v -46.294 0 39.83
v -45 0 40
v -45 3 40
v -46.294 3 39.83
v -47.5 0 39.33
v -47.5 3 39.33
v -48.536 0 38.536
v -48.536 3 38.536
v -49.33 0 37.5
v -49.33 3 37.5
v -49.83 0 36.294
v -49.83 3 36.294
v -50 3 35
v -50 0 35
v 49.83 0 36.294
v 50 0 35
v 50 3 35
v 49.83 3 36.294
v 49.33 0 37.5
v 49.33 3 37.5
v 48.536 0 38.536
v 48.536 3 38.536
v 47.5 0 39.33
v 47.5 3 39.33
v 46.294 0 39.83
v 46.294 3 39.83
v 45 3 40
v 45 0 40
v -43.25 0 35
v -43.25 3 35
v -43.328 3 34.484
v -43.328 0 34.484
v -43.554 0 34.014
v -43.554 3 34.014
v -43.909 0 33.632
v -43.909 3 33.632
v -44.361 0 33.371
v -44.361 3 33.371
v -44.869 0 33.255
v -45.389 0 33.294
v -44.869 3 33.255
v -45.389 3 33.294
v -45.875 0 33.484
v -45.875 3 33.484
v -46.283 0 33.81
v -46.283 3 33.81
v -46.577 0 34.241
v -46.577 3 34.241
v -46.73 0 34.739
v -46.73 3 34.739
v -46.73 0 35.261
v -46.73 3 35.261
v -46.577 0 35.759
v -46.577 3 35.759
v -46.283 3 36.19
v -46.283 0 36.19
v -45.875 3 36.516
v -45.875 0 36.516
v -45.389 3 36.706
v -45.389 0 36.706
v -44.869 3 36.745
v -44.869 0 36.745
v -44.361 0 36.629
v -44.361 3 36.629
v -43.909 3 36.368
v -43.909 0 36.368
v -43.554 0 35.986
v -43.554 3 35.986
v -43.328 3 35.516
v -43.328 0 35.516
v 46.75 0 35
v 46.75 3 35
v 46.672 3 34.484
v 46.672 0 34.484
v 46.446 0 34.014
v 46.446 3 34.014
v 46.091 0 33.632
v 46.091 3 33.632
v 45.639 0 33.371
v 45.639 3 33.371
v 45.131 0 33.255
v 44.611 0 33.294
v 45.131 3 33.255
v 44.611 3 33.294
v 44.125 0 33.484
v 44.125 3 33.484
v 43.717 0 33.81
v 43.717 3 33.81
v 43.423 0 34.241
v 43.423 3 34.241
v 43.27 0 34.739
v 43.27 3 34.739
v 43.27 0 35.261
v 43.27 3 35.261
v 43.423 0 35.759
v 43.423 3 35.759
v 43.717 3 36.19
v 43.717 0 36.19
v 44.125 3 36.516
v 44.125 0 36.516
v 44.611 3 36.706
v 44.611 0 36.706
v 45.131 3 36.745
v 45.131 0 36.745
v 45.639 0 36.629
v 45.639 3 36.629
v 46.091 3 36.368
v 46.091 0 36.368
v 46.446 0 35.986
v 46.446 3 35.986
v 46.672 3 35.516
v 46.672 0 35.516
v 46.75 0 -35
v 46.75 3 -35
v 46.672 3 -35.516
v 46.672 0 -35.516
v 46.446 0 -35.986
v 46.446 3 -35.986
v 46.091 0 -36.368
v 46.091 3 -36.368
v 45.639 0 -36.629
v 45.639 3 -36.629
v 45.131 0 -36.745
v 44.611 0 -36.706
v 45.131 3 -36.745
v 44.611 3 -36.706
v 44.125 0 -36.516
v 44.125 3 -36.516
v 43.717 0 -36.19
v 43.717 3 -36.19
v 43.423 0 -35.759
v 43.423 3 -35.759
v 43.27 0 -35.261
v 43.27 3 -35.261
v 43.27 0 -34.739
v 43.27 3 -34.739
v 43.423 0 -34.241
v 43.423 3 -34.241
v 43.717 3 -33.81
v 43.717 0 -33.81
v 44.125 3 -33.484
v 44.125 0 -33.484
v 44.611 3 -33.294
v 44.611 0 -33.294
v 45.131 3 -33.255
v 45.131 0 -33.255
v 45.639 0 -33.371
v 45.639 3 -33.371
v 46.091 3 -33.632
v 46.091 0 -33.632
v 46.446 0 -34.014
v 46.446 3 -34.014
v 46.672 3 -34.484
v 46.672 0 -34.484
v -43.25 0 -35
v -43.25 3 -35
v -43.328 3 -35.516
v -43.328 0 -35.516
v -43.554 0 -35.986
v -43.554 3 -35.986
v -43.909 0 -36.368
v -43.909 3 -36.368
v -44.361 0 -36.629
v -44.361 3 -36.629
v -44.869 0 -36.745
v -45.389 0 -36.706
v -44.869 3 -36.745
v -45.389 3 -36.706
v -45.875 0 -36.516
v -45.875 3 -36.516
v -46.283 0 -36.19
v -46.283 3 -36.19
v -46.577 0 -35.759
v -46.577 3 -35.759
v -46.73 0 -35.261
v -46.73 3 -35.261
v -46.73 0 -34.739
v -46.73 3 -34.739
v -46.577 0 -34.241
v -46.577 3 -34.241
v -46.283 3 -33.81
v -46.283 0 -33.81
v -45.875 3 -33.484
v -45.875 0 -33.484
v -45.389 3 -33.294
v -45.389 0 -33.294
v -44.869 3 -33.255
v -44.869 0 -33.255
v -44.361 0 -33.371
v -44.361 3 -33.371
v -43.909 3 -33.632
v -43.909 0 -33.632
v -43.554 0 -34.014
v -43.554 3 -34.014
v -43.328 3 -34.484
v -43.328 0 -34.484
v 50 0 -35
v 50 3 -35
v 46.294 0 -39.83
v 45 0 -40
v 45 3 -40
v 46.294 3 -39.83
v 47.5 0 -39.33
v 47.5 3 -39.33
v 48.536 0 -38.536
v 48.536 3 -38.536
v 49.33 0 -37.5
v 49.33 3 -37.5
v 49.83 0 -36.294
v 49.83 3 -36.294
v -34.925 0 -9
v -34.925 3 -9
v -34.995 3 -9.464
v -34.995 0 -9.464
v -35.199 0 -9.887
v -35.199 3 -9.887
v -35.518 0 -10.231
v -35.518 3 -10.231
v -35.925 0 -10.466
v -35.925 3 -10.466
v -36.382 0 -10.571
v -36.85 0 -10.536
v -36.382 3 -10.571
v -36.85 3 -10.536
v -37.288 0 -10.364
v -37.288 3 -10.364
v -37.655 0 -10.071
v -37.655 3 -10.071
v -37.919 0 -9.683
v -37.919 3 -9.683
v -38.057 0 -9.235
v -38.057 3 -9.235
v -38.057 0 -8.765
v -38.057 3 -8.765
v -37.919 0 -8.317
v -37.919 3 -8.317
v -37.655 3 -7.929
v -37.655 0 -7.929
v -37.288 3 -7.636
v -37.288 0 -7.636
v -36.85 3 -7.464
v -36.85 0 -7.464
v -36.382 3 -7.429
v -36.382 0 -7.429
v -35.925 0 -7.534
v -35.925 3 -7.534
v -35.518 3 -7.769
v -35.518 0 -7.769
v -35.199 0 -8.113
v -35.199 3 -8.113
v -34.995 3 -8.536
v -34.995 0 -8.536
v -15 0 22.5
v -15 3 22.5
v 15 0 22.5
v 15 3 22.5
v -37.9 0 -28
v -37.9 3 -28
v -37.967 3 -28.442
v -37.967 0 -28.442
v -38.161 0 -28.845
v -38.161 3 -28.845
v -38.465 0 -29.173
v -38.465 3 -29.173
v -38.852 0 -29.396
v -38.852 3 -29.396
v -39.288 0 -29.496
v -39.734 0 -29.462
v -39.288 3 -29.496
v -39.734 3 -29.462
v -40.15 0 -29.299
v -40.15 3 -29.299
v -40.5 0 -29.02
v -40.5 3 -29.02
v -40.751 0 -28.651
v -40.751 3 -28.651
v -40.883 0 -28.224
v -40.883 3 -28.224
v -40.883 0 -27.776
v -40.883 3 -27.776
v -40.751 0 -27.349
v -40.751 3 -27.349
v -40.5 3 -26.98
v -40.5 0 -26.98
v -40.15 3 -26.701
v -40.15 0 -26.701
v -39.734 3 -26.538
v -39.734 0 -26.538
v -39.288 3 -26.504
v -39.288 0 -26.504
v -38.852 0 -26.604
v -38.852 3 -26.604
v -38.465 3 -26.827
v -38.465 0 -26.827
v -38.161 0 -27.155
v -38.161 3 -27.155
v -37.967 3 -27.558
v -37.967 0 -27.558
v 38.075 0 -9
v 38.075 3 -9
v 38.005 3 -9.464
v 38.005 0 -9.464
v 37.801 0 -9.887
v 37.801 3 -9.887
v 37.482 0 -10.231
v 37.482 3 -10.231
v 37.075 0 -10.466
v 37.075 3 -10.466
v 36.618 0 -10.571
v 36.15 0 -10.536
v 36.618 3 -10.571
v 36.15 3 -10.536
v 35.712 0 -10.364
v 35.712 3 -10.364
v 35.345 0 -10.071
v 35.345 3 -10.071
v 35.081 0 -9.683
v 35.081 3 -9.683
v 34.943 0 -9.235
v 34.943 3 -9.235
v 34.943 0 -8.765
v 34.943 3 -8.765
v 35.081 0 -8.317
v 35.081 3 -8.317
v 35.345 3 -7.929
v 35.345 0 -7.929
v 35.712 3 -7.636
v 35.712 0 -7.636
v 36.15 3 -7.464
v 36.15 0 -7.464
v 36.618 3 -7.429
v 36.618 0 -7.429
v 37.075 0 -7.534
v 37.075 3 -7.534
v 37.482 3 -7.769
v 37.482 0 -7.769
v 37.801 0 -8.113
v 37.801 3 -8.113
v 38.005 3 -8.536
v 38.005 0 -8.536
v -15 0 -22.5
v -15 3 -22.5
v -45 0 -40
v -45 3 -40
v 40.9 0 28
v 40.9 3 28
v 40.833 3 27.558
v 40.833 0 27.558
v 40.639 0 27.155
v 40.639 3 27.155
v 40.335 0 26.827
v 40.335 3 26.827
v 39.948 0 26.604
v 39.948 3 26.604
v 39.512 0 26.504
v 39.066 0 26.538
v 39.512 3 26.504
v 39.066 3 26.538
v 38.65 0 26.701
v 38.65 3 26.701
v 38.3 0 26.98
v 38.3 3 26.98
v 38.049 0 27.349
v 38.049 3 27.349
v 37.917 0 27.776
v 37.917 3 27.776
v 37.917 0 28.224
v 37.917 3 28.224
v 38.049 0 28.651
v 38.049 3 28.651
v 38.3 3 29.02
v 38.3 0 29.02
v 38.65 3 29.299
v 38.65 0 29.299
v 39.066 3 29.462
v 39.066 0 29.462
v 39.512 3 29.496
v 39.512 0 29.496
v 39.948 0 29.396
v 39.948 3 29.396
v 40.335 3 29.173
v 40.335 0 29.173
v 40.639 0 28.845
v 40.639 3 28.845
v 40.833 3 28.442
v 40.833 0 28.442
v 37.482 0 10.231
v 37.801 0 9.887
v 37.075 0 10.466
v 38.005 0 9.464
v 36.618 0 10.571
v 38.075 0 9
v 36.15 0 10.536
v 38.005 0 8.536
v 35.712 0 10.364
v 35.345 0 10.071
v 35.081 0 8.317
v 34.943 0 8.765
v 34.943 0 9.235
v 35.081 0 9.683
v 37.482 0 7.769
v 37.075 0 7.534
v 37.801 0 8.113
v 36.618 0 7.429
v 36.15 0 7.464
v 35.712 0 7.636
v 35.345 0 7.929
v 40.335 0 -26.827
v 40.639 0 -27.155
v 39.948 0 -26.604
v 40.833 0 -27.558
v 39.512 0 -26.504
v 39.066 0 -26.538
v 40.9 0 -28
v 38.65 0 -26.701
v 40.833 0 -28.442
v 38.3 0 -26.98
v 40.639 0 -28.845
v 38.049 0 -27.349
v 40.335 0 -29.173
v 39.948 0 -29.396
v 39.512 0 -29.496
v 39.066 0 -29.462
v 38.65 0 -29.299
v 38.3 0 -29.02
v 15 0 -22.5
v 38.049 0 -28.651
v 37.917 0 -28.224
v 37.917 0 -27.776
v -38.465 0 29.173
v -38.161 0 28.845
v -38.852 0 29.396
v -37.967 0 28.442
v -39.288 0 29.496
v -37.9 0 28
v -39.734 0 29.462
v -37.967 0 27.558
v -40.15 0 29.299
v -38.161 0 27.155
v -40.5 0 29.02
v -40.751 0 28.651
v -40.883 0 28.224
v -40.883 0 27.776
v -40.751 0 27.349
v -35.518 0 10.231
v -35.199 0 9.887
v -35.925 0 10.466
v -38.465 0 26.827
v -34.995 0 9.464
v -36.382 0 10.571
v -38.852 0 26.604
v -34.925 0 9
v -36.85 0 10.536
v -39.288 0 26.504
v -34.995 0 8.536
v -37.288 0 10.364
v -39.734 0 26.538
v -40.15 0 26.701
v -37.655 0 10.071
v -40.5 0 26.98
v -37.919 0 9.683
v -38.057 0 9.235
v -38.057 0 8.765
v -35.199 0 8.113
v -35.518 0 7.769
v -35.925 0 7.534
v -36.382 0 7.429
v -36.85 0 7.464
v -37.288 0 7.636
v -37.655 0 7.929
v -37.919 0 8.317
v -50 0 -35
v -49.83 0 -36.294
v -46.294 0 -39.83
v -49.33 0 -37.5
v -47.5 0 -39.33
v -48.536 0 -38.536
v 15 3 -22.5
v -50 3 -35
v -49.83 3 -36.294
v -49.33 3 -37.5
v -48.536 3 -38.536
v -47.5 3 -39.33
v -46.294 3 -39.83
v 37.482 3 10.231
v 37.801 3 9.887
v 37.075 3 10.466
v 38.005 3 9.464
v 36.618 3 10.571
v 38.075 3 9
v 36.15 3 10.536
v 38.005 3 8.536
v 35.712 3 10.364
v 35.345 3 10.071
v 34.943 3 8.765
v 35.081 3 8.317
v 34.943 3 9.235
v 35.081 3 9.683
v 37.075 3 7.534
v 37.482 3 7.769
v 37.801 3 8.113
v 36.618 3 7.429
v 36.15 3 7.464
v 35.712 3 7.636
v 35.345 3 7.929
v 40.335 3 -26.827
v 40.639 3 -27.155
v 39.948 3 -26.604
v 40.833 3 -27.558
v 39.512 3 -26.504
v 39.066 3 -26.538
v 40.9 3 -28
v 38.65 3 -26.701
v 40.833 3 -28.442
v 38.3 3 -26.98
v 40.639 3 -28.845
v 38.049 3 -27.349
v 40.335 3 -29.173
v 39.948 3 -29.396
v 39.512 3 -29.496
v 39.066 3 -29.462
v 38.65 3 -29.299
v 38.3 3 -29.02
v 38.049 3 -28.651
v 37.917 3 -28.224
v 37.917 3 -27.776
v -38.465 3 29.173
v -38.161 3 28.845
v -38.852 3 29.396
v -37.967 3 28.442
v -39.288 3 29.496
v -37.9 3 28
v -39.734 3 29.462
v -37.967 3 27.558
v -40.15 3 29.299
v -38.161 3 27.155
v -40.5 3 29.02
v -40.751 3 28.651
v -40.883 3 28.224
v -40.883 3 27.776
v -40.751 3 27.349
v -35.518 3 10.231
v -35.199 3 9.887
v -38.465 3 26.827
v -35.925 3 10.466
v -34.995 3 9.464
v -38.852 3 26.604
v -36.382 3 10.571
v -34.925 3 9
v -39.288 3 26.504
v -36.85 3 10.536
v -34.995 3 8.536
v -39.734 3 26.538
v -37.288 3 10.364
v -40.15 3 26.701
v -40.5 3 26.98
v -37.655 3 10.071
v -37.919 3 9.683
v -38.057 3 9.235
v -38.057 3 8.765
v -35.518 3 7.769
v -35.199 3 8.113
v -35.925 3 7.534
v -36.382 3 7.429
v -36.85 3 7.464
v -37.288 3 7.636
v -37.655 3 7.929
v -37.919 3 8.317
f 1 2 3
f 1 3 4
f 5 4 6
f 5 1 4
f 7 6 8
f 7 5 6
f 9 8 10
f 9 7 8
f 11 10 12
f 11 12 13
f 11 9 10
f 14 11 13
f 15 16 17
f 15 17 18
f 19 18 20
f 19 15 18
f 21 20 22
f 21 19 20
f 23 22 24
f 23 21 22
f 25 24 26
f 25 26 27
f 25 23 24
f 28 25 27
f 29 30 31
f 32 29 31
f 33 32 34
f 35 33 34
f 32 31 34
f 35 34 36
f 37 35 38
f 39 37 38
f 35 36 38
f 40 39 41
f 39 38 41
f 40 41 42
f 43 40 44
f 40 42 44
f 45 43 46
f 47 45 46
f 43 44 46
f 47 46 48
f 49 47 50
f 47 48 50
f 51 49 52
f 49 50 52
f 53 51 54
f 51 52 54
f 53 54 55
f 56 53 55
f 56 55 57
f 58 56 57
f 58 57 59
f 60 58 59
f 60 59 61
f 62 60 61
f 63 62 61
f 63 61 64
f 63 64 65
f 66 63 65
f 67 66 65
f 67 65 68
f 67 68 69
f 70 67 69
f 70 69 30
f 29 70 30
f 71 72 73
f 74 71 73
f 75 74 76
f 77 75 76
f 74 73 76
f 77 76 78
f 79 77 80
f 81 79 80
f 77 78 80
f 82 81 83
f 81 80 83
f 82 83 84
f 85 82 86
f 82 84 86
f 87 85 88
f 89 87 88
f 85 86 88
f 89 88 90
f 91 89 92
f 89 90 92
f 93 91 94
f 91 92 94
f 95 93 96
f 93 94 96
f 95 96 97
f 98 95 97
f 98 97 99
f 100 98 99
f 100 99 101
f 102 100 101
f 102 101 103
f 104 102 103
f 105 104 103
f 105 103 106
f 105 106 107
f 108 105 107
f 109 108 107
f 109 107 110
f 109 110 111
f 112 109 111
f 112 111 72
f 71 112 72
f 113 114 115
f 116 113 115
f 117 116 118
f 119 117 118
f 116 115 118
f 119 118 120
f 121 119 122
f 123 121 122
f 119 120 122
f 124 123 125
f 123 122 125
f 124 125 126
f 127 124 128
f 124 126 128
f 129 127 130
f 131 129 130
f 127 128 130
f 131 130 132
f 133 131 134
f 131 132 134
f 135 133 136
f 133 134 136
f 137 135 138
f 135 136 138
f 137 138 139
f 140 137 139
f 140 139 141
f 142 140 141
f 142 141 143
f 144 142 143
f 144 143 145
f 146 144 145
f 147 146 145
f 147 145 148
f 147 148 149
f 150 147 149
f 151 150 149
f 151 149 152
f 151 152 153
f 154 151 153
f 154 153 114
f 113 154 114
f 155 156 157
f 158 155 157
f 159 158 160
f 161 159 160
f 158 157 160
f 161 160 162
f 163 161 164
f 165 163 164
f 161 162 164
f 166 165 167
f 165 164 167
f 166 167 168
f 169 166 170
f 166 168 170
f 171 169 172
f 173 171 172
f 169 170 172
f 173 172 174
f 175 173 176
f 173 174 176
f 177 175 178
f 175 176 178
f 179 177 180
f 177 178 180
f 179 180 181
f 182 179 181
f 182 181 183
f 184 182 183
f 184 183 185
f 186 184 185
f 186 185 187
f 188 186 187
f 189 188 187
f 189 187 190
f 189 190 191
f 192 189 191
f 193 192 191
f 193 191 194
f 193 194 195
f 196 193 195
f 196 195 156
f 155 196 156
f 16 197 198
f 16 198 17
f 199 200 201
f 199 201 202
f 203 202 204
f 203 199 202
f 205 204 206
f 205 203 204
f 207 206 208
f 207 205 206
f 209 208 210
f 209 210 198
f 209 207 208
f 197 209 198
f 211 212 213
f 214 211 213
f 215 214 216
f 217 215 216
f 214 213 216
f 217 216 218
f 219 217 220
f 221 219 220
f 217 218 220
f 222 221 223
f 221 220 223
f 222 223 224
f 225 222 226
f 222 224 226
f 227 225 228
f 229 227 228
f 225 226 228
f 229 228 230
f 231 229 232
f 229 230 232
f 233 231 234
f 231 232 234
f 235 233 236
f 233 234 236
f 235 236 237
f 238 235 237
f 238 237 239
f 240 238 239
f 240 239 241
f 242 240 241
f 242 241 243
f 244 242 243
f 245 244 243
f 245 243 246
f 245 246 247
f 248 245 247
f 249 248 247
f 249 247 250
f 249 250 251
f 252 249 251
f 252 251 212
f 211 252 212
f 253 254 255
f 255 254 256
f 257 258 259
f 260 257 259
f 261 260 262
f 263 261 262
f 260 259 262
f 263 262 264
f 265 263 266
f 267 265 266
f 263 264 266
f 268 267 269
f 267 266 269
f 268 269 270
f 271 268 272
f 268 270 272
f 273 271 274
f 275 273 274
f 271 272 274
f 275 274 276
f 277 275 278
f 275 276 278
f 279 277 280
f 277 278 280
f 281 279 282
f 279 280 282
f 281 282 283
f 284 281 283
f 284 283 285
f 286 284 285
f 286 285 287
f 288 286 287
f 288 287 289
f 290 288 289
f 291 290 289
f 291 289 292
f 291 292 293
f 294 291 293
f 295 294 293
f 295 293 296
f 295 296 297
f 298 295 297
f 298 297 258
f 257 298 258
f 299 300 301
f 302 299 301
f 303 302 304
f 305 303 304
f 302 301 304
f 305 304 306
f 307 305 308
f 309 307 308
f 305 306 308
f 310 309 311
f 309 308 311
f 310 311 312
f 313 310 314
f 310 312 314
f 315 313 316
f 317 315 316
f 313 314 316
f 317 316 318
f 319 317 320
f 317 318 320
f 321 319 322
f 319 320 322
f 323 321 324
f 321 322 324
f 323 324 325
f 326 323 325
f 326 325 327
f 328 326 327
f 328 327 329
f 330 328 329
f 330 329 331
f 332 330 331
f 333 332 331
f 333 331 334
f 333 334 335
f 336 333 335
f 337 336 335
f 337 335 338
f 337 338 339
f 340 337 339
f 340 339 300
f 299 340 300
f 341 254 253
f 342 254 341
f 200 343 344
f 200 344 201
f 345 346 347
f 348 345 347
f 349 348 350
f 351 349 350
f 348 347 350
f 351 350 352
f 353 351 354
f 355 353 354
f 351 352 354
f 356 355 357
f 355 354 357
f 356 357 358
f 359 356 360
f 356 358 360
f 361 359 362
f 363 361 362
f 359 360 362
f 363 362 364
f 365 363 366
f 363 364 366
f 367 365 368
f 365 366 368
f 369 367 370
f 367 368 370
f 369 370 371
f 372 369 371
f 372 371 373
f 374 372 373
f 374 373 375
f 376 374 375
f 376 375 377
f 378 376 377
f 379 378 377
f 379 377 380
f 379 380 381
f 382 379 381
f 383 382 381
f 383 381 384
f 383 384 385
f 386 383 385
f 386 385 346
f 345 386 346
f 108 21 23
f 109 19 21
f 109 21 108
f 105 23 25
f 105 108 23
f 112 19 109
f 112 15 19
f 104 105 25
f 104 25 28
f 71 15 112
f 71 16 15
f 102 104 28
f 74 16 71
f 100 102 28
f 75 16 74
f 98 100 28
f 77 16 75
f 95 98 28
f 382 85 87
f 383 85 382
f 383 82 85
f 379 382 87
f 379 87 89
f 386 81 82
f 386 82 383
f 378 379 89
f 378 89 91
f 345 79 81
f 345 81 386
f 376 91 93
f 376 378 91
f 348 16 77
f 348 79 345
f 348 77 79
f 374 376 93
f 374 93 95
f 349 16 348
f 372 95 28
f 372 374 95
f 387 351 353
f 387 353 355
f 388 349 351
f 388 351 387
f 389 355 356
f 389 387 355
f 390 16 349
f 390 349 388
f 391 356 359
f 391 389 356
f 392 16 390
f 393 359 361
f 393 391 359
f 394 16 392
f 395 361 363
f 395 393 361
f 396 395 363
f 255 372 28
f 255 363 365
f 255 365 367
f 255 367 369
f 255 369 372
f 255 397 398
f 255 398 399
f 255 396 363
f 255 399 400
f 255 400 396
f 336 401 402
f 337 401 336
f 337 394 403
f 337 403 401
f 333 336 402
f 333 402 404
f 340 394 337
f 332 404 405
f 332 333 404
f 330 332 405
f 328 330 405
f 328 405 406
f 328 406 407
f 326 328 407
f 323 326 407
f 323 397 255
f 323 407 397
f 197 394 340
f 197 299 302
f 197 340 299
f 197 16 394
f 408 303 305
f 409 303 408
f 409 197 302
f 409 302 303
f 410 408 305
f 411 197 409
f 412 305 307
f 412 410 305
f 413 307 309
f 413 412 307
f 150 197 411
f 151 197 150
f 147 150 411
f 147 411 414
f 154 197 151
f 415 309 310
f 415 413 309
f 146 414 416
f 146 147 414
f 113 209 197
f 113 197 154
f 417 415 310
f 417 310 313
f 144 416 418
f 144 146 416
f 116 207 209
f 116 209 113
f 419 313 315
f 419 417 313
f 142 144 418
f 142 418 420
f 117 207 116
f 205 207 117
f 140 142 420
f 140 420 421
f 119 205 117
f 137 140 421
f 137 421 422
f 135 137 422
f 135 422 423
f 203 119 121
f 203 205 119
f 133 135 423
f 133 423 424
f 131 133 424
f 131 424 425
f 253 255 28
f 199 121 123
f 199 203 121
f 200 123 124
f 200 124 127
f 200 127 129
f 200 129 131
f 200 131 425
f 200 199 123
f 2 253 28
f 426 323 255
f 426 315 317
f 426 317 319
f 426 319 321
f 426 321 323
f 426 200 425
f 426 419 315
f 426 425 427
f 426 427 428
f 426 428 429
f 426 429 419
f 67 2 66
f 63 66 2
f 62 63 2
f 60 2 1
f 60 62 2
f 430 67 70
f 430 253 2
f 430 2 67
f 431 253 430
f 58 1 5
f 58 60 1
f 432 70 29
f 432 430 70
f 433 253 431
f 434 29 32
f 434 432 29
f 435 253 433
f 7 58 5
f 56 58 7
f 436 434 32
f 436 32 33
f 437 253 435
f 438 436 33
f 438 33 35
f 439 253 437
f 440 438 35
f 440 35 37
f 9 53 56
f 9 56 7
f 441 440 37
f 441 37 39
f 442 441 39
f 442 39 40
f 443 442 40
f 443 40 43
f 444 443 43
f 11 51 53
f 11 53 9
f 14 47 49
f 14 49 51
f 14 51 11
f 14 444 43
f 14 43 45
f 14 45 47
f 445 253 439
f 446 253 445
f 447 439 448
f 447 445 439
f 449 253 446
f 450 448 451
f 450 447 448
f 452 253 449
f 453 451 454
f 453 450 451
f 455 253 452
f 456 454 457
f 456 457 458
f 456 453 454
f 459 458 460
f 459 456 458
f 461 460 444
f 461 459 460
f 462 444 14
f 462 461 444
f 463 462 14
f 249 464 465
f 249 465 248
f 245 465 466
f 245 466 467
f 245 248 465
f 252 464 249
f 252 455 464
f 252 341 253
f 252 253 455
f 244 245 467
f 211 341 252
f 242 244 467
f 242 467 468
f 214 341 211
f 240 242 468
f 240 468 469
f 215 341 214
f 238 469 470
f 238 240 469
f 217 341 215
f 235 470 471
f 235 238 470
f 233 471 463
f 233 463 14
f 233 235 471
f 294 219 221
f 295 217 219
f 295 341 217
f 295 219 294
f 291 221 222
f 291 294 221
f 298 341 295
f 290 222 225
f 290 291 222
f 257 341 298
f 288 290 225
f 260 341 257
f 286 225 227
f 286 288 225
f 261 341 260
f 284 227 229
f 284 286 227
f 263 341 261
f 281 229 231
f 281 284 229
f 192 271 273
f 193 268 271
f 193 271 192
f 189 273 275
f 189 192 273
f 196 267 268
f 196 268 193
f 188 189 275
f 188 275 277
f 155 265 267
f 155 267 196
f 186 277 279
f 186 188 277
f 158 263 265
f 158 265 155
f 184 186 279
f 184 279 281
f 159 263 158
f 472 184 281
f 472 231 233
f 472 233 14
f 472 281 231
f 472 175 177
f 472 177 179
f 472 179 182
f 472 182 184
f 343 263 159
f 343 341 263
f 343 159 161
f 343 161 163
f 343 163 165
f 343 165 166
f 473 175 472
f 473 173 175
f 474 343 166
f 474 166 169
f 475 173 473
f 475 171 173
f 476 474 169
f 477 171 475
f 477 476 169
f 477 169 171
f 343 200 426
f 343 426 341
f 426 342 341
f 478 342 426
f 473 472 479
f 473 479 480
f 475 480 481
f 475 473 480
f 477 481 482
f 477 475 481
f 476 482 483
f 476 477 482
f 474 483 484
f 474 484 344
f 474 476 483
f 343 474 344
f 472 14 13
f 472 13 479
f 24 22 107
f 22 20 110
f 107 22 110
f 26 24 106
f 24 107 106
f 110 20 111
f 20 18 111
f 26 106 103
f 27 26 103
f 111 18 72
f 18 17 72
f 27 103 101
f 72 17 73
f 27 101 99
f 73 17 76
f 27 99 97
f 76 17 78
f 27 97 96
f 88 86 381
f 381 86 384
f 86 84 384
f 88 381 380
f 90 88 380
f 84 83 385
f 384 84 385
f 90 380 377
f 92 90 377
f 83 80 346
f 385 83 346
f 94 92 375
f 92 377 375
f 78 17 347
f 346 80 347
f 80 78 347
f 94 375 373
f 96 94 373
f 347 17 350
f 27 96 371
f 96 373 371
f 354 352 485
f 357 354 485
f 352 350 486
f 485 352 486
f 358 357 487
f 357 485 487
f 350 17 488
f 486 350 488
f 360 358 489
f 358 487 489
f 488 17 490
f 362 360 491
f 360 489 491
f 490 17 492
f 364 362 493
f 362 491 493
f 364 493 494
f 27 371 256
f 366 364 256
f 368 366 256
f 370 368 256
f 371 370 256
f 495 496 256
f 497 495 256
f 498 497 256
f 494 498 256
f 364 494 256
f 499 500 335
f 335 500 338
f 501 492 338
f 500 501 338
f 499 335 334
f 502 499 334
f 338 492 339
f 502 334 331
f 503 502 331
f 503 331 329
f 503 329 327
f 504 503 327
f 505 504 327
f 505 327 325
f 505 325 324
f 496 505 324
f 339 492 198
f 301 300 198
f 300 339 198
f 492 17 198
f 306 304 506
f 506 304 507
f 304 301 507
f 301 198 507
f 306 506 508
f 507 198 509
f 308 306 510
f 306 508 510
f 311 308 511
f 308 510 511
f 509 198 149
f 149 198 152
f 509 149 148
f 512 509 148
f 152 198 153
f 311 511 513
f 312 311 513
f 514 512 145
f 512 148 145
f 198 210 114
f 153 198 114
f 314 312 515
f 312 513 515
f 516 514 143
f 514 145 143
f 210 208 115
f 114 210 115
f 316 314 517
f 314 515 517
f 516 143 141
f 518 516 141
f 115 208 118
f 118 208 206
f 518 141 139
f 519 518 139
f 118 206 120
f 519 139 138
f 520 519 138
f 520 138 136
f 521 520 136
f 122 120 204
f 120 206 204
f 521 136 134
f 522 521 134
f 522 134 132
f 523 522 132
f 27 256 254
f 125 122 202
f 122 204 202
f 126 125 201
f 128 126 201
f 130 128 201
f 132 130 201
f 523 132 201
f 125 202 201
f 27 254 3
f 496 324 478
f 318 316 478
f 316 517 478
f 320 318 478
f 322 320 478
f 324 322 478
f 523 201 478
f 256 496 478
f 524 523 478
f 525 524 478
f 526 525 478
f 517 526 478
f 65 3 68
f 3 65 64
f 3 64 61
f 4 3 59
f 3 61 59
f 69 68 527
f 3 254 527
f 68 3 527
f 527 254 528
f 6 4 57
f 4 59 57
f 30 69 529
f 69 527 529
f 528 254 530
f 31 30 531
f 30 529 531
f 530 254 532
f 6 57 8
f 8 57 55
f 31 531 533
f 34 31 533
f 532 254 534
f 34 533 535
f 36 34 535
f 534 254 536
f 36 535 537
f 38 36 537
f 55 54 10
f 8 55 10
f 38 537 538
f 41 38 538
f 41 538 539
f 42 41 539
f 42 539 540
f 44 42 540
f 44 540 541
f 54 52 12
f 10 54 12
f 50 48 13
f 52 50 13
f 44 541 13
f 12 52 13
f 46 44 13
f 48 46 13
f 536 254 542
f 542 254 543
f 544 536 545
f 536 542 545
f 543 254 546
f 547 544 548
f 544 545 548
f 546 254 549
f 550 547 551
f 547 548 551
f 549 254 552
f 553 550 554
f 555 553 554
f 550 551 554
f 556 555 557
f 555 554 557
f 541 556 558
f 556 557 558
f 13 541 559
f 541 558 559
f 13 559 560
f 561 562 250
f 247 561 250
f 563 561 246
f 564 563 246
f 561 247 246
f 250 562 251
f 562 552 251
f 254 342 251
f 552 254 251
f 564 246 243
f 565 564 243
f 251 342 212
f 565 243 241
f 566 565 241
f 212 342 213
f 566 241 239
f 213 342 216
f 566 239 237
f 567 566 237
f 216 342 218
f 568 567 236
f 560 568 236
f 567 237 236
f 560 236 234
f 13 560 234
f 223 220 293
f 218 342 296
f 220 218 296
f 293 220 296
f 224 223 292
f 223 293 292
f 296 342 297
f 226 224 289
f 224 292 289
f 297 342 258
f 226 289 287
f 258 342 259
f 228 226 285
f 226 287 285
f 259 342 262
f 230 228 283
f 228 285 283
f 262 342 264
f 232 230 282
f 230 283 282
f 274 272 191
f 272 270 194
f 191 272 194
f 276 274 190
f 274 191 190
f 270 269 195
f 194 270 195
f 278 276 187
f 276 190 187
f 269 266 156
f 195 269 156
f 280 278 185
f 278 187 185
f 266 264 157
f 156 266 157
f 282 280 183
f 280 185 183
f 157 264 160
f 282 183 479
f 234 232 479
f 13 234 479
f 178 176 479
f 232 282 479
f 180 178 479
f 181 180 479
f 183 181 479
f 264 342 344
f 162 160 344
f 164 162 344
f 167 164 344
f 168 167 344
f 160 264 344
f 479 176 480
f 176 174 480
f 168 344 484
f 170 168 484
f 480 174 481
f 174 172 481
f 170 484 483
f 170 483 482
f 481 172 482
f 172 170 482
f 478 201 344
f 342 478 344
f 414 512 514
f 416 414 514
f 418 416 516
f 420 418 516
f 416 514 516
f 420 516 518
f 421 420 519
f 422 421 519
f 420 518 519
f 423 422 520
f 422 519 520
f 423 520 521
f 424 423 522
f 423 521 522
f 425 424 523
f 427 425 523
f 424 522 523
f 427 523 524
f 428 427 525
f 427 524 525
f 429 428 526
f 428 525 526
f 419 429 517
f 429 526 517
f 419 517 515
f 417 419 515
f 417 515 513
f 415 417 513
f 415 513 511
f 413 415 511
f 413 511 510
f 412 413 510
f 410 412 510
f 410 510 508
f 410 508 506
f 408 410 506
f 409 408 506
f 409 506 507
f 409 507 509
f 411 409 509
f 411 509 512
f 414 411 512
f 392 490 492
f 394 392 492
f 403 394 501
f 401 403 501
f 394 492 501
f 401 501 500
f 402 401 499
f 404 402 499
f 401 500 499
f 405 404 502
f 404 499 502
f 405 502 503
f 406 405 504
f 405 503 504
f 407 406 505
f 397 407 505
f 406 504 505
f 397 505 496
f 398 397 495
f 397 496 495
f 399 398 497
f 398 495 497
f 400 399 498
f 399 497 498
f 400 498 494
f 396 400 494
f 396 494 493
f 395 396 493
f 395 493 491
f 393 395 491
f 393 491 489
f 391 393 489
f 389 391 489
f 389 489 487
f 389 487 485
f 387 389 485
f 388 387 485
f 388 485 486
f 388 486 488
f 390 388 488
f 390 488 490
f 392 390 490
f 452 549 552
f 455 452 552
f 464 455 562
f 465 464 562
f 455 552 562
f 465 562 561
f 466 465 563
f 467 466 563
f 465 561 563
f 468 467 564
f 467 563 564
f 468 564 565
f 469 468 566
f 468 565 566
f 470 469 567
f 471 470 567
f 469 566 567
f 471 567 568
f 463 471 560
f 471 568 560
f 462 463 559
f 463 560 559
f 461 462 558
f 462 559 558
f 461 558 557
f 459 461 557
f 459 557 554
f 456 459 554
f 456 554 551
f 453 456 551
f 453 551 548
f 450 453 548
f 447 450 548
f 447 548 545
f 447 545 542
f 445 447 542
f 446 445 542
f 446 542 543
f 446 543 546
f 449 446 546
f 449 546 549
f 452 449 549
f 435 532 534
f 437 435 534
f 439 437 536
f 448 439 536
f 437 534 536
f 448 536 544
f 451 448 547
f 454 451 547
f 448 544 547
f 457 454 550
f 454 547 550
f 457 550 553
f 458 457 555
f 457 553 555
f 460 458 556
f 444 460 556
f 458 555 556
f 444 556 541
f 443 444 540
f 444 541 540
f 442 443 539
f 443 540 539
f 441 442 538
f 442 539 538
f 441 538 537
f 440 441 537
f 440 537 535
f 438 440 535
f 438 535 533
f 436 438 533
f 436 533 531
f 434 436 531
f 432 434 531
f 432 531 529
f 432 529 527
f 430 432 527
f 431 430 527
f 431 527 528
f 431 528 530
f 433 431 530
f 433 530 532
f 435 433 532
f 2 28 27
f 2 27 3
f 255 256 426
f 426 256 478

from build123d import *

# Parameters (mm, degrees)
BOSS_EXTRUDE1_DEPTH  = 3
SKETCH2_R            = 1.575
CUT_EXTRUDE1_DEPTH   = 4
SKETCH3_R            = 1.75
CUT_EXTRUDE2_DEPTH   = 4
LPATTERN1_COUNT      = 2
LPATTERN1_PITCH      = 70
LPATTERN1_COUNT_DIR2 = 2
LPATTERN1_PITCH_DIR2 = 90
SKETCH4_R            = 1.5
CUT_EXTRUDE3_DEPTH   = 4
SKETCH5_W            = 30
SKETCH5_H            = 45
CUT_EXTRUDE4_DEPTH   = 4


with BuildPart() as part:
    # Sketch1 → Boss-Extrude1 (new body)
    with BuildSketch(Plane(origin=(0, 0, 0), x_dir=(1, 0, 0), z_dir=(0, 1, 0))):
        with BuildLine():
            Line((-45, 40), (45, 40))
            ThreePointArc((45, 40), (48.535533906, 38.535533906), (50, 35))
            Line((50, 35), (50, -35))
            ThreePointArc((50, -35), (48.535533906, -38.535533906), (45, -40))
            Line((45, -40), (-45, -40))
            ThreePointArc((-45, -40), (-48.535533906, -38.535533906), (-50, -35))
            Line((-50, -35), (-50, 35))
            ThreePointArc((-50, 35), (-48.535533906, 38.535533906), (-45, 40))
        make_face()
    extrude(amount=BOSS_EXTRUDE1_DEPTH)

    # Sketch2 → Cut-Extrude1 (cut)
    with BuildSketch(Plane(origin=(0, 3, 0), x_dir=(1, 0, 0), z_dir=(0, 1, 0))):
        with Locations((-36.5, 9)):
            Circle(SKETCH2_R)
        with Locations((-36.5, -9)):
            Circle(SKETCH2_R)
        with Locations((36.5, -9)):
            Circle(SKETCH2_R)
        with Locations((36.5, 9)):
            Circle(SKETCH2_R)
    extrude(amount=-CUT_EXTRUDE1_DEPTH, mode=Mode.SUBTRACT)

    # Sketch3 → Cut-Extrude2 (cut, through all)
    with BuildSketch(Plane(origin=(0, 3, 0), x_dir=(1, 0, 0), z_dir=(0, 1, 0))):
        with Locations((-45, -35)):
            Circle(SKETCH3_R)
    cut_extrude2 = extrude(amount=-CUT_EXTRUDE2_DEPTH, mode=Mode.SUBTRACT)

    # LPattern1: Cut-Extrude2 2 × 2
    with Locations(*[(j * LPATTERN1_PITCH_DIR2, 0, -i * LPATTERN1_PITCH) for i in range(LPATTERN1_COUNT) for j in range(LPATTERN1_COUNT_DIR2) if (i, j) != (0, 0)]):
        add(cut_extrude2, mode=Mode.SUBTRACT)

    # Sketch4 → Cut-Extrude3 (cut, through all)
    with BuildSketch(Plane(origin=(0, 3, 0), x_dir=(1, 0, 0), z_dir=(0, 1, 0))):
        with Locations((-39.4, 28)):
            Circle(SKETCH4_R)
        with Locations((39.4, 28)):
            Circle(SKETCH4_R)
        with Locations((39.4, -28)):
            Circle(SKETCH4_R)
        with Locations((-39.4, -28)):
            Circle(SKETCH4_R)
    extrude(amount=-CUT_EXTRUDE3_DEPTH, mode=Mode.SUBTRACT)

    # Sketch5 → Cut-Extrude4 (cut, through all)
    with BuildSketch(Plane(origin=(0, 3, 0), x_dir=(1, 0, 0), z_dir=(0, 1, 0))):
        Rectangle(SKETCH5_W, SKETCH5_H)
    extrude(amount=-CUT_EXTRUDE4_DEPTH, mode=Mode.SUBTRACT)


solid = part.part
